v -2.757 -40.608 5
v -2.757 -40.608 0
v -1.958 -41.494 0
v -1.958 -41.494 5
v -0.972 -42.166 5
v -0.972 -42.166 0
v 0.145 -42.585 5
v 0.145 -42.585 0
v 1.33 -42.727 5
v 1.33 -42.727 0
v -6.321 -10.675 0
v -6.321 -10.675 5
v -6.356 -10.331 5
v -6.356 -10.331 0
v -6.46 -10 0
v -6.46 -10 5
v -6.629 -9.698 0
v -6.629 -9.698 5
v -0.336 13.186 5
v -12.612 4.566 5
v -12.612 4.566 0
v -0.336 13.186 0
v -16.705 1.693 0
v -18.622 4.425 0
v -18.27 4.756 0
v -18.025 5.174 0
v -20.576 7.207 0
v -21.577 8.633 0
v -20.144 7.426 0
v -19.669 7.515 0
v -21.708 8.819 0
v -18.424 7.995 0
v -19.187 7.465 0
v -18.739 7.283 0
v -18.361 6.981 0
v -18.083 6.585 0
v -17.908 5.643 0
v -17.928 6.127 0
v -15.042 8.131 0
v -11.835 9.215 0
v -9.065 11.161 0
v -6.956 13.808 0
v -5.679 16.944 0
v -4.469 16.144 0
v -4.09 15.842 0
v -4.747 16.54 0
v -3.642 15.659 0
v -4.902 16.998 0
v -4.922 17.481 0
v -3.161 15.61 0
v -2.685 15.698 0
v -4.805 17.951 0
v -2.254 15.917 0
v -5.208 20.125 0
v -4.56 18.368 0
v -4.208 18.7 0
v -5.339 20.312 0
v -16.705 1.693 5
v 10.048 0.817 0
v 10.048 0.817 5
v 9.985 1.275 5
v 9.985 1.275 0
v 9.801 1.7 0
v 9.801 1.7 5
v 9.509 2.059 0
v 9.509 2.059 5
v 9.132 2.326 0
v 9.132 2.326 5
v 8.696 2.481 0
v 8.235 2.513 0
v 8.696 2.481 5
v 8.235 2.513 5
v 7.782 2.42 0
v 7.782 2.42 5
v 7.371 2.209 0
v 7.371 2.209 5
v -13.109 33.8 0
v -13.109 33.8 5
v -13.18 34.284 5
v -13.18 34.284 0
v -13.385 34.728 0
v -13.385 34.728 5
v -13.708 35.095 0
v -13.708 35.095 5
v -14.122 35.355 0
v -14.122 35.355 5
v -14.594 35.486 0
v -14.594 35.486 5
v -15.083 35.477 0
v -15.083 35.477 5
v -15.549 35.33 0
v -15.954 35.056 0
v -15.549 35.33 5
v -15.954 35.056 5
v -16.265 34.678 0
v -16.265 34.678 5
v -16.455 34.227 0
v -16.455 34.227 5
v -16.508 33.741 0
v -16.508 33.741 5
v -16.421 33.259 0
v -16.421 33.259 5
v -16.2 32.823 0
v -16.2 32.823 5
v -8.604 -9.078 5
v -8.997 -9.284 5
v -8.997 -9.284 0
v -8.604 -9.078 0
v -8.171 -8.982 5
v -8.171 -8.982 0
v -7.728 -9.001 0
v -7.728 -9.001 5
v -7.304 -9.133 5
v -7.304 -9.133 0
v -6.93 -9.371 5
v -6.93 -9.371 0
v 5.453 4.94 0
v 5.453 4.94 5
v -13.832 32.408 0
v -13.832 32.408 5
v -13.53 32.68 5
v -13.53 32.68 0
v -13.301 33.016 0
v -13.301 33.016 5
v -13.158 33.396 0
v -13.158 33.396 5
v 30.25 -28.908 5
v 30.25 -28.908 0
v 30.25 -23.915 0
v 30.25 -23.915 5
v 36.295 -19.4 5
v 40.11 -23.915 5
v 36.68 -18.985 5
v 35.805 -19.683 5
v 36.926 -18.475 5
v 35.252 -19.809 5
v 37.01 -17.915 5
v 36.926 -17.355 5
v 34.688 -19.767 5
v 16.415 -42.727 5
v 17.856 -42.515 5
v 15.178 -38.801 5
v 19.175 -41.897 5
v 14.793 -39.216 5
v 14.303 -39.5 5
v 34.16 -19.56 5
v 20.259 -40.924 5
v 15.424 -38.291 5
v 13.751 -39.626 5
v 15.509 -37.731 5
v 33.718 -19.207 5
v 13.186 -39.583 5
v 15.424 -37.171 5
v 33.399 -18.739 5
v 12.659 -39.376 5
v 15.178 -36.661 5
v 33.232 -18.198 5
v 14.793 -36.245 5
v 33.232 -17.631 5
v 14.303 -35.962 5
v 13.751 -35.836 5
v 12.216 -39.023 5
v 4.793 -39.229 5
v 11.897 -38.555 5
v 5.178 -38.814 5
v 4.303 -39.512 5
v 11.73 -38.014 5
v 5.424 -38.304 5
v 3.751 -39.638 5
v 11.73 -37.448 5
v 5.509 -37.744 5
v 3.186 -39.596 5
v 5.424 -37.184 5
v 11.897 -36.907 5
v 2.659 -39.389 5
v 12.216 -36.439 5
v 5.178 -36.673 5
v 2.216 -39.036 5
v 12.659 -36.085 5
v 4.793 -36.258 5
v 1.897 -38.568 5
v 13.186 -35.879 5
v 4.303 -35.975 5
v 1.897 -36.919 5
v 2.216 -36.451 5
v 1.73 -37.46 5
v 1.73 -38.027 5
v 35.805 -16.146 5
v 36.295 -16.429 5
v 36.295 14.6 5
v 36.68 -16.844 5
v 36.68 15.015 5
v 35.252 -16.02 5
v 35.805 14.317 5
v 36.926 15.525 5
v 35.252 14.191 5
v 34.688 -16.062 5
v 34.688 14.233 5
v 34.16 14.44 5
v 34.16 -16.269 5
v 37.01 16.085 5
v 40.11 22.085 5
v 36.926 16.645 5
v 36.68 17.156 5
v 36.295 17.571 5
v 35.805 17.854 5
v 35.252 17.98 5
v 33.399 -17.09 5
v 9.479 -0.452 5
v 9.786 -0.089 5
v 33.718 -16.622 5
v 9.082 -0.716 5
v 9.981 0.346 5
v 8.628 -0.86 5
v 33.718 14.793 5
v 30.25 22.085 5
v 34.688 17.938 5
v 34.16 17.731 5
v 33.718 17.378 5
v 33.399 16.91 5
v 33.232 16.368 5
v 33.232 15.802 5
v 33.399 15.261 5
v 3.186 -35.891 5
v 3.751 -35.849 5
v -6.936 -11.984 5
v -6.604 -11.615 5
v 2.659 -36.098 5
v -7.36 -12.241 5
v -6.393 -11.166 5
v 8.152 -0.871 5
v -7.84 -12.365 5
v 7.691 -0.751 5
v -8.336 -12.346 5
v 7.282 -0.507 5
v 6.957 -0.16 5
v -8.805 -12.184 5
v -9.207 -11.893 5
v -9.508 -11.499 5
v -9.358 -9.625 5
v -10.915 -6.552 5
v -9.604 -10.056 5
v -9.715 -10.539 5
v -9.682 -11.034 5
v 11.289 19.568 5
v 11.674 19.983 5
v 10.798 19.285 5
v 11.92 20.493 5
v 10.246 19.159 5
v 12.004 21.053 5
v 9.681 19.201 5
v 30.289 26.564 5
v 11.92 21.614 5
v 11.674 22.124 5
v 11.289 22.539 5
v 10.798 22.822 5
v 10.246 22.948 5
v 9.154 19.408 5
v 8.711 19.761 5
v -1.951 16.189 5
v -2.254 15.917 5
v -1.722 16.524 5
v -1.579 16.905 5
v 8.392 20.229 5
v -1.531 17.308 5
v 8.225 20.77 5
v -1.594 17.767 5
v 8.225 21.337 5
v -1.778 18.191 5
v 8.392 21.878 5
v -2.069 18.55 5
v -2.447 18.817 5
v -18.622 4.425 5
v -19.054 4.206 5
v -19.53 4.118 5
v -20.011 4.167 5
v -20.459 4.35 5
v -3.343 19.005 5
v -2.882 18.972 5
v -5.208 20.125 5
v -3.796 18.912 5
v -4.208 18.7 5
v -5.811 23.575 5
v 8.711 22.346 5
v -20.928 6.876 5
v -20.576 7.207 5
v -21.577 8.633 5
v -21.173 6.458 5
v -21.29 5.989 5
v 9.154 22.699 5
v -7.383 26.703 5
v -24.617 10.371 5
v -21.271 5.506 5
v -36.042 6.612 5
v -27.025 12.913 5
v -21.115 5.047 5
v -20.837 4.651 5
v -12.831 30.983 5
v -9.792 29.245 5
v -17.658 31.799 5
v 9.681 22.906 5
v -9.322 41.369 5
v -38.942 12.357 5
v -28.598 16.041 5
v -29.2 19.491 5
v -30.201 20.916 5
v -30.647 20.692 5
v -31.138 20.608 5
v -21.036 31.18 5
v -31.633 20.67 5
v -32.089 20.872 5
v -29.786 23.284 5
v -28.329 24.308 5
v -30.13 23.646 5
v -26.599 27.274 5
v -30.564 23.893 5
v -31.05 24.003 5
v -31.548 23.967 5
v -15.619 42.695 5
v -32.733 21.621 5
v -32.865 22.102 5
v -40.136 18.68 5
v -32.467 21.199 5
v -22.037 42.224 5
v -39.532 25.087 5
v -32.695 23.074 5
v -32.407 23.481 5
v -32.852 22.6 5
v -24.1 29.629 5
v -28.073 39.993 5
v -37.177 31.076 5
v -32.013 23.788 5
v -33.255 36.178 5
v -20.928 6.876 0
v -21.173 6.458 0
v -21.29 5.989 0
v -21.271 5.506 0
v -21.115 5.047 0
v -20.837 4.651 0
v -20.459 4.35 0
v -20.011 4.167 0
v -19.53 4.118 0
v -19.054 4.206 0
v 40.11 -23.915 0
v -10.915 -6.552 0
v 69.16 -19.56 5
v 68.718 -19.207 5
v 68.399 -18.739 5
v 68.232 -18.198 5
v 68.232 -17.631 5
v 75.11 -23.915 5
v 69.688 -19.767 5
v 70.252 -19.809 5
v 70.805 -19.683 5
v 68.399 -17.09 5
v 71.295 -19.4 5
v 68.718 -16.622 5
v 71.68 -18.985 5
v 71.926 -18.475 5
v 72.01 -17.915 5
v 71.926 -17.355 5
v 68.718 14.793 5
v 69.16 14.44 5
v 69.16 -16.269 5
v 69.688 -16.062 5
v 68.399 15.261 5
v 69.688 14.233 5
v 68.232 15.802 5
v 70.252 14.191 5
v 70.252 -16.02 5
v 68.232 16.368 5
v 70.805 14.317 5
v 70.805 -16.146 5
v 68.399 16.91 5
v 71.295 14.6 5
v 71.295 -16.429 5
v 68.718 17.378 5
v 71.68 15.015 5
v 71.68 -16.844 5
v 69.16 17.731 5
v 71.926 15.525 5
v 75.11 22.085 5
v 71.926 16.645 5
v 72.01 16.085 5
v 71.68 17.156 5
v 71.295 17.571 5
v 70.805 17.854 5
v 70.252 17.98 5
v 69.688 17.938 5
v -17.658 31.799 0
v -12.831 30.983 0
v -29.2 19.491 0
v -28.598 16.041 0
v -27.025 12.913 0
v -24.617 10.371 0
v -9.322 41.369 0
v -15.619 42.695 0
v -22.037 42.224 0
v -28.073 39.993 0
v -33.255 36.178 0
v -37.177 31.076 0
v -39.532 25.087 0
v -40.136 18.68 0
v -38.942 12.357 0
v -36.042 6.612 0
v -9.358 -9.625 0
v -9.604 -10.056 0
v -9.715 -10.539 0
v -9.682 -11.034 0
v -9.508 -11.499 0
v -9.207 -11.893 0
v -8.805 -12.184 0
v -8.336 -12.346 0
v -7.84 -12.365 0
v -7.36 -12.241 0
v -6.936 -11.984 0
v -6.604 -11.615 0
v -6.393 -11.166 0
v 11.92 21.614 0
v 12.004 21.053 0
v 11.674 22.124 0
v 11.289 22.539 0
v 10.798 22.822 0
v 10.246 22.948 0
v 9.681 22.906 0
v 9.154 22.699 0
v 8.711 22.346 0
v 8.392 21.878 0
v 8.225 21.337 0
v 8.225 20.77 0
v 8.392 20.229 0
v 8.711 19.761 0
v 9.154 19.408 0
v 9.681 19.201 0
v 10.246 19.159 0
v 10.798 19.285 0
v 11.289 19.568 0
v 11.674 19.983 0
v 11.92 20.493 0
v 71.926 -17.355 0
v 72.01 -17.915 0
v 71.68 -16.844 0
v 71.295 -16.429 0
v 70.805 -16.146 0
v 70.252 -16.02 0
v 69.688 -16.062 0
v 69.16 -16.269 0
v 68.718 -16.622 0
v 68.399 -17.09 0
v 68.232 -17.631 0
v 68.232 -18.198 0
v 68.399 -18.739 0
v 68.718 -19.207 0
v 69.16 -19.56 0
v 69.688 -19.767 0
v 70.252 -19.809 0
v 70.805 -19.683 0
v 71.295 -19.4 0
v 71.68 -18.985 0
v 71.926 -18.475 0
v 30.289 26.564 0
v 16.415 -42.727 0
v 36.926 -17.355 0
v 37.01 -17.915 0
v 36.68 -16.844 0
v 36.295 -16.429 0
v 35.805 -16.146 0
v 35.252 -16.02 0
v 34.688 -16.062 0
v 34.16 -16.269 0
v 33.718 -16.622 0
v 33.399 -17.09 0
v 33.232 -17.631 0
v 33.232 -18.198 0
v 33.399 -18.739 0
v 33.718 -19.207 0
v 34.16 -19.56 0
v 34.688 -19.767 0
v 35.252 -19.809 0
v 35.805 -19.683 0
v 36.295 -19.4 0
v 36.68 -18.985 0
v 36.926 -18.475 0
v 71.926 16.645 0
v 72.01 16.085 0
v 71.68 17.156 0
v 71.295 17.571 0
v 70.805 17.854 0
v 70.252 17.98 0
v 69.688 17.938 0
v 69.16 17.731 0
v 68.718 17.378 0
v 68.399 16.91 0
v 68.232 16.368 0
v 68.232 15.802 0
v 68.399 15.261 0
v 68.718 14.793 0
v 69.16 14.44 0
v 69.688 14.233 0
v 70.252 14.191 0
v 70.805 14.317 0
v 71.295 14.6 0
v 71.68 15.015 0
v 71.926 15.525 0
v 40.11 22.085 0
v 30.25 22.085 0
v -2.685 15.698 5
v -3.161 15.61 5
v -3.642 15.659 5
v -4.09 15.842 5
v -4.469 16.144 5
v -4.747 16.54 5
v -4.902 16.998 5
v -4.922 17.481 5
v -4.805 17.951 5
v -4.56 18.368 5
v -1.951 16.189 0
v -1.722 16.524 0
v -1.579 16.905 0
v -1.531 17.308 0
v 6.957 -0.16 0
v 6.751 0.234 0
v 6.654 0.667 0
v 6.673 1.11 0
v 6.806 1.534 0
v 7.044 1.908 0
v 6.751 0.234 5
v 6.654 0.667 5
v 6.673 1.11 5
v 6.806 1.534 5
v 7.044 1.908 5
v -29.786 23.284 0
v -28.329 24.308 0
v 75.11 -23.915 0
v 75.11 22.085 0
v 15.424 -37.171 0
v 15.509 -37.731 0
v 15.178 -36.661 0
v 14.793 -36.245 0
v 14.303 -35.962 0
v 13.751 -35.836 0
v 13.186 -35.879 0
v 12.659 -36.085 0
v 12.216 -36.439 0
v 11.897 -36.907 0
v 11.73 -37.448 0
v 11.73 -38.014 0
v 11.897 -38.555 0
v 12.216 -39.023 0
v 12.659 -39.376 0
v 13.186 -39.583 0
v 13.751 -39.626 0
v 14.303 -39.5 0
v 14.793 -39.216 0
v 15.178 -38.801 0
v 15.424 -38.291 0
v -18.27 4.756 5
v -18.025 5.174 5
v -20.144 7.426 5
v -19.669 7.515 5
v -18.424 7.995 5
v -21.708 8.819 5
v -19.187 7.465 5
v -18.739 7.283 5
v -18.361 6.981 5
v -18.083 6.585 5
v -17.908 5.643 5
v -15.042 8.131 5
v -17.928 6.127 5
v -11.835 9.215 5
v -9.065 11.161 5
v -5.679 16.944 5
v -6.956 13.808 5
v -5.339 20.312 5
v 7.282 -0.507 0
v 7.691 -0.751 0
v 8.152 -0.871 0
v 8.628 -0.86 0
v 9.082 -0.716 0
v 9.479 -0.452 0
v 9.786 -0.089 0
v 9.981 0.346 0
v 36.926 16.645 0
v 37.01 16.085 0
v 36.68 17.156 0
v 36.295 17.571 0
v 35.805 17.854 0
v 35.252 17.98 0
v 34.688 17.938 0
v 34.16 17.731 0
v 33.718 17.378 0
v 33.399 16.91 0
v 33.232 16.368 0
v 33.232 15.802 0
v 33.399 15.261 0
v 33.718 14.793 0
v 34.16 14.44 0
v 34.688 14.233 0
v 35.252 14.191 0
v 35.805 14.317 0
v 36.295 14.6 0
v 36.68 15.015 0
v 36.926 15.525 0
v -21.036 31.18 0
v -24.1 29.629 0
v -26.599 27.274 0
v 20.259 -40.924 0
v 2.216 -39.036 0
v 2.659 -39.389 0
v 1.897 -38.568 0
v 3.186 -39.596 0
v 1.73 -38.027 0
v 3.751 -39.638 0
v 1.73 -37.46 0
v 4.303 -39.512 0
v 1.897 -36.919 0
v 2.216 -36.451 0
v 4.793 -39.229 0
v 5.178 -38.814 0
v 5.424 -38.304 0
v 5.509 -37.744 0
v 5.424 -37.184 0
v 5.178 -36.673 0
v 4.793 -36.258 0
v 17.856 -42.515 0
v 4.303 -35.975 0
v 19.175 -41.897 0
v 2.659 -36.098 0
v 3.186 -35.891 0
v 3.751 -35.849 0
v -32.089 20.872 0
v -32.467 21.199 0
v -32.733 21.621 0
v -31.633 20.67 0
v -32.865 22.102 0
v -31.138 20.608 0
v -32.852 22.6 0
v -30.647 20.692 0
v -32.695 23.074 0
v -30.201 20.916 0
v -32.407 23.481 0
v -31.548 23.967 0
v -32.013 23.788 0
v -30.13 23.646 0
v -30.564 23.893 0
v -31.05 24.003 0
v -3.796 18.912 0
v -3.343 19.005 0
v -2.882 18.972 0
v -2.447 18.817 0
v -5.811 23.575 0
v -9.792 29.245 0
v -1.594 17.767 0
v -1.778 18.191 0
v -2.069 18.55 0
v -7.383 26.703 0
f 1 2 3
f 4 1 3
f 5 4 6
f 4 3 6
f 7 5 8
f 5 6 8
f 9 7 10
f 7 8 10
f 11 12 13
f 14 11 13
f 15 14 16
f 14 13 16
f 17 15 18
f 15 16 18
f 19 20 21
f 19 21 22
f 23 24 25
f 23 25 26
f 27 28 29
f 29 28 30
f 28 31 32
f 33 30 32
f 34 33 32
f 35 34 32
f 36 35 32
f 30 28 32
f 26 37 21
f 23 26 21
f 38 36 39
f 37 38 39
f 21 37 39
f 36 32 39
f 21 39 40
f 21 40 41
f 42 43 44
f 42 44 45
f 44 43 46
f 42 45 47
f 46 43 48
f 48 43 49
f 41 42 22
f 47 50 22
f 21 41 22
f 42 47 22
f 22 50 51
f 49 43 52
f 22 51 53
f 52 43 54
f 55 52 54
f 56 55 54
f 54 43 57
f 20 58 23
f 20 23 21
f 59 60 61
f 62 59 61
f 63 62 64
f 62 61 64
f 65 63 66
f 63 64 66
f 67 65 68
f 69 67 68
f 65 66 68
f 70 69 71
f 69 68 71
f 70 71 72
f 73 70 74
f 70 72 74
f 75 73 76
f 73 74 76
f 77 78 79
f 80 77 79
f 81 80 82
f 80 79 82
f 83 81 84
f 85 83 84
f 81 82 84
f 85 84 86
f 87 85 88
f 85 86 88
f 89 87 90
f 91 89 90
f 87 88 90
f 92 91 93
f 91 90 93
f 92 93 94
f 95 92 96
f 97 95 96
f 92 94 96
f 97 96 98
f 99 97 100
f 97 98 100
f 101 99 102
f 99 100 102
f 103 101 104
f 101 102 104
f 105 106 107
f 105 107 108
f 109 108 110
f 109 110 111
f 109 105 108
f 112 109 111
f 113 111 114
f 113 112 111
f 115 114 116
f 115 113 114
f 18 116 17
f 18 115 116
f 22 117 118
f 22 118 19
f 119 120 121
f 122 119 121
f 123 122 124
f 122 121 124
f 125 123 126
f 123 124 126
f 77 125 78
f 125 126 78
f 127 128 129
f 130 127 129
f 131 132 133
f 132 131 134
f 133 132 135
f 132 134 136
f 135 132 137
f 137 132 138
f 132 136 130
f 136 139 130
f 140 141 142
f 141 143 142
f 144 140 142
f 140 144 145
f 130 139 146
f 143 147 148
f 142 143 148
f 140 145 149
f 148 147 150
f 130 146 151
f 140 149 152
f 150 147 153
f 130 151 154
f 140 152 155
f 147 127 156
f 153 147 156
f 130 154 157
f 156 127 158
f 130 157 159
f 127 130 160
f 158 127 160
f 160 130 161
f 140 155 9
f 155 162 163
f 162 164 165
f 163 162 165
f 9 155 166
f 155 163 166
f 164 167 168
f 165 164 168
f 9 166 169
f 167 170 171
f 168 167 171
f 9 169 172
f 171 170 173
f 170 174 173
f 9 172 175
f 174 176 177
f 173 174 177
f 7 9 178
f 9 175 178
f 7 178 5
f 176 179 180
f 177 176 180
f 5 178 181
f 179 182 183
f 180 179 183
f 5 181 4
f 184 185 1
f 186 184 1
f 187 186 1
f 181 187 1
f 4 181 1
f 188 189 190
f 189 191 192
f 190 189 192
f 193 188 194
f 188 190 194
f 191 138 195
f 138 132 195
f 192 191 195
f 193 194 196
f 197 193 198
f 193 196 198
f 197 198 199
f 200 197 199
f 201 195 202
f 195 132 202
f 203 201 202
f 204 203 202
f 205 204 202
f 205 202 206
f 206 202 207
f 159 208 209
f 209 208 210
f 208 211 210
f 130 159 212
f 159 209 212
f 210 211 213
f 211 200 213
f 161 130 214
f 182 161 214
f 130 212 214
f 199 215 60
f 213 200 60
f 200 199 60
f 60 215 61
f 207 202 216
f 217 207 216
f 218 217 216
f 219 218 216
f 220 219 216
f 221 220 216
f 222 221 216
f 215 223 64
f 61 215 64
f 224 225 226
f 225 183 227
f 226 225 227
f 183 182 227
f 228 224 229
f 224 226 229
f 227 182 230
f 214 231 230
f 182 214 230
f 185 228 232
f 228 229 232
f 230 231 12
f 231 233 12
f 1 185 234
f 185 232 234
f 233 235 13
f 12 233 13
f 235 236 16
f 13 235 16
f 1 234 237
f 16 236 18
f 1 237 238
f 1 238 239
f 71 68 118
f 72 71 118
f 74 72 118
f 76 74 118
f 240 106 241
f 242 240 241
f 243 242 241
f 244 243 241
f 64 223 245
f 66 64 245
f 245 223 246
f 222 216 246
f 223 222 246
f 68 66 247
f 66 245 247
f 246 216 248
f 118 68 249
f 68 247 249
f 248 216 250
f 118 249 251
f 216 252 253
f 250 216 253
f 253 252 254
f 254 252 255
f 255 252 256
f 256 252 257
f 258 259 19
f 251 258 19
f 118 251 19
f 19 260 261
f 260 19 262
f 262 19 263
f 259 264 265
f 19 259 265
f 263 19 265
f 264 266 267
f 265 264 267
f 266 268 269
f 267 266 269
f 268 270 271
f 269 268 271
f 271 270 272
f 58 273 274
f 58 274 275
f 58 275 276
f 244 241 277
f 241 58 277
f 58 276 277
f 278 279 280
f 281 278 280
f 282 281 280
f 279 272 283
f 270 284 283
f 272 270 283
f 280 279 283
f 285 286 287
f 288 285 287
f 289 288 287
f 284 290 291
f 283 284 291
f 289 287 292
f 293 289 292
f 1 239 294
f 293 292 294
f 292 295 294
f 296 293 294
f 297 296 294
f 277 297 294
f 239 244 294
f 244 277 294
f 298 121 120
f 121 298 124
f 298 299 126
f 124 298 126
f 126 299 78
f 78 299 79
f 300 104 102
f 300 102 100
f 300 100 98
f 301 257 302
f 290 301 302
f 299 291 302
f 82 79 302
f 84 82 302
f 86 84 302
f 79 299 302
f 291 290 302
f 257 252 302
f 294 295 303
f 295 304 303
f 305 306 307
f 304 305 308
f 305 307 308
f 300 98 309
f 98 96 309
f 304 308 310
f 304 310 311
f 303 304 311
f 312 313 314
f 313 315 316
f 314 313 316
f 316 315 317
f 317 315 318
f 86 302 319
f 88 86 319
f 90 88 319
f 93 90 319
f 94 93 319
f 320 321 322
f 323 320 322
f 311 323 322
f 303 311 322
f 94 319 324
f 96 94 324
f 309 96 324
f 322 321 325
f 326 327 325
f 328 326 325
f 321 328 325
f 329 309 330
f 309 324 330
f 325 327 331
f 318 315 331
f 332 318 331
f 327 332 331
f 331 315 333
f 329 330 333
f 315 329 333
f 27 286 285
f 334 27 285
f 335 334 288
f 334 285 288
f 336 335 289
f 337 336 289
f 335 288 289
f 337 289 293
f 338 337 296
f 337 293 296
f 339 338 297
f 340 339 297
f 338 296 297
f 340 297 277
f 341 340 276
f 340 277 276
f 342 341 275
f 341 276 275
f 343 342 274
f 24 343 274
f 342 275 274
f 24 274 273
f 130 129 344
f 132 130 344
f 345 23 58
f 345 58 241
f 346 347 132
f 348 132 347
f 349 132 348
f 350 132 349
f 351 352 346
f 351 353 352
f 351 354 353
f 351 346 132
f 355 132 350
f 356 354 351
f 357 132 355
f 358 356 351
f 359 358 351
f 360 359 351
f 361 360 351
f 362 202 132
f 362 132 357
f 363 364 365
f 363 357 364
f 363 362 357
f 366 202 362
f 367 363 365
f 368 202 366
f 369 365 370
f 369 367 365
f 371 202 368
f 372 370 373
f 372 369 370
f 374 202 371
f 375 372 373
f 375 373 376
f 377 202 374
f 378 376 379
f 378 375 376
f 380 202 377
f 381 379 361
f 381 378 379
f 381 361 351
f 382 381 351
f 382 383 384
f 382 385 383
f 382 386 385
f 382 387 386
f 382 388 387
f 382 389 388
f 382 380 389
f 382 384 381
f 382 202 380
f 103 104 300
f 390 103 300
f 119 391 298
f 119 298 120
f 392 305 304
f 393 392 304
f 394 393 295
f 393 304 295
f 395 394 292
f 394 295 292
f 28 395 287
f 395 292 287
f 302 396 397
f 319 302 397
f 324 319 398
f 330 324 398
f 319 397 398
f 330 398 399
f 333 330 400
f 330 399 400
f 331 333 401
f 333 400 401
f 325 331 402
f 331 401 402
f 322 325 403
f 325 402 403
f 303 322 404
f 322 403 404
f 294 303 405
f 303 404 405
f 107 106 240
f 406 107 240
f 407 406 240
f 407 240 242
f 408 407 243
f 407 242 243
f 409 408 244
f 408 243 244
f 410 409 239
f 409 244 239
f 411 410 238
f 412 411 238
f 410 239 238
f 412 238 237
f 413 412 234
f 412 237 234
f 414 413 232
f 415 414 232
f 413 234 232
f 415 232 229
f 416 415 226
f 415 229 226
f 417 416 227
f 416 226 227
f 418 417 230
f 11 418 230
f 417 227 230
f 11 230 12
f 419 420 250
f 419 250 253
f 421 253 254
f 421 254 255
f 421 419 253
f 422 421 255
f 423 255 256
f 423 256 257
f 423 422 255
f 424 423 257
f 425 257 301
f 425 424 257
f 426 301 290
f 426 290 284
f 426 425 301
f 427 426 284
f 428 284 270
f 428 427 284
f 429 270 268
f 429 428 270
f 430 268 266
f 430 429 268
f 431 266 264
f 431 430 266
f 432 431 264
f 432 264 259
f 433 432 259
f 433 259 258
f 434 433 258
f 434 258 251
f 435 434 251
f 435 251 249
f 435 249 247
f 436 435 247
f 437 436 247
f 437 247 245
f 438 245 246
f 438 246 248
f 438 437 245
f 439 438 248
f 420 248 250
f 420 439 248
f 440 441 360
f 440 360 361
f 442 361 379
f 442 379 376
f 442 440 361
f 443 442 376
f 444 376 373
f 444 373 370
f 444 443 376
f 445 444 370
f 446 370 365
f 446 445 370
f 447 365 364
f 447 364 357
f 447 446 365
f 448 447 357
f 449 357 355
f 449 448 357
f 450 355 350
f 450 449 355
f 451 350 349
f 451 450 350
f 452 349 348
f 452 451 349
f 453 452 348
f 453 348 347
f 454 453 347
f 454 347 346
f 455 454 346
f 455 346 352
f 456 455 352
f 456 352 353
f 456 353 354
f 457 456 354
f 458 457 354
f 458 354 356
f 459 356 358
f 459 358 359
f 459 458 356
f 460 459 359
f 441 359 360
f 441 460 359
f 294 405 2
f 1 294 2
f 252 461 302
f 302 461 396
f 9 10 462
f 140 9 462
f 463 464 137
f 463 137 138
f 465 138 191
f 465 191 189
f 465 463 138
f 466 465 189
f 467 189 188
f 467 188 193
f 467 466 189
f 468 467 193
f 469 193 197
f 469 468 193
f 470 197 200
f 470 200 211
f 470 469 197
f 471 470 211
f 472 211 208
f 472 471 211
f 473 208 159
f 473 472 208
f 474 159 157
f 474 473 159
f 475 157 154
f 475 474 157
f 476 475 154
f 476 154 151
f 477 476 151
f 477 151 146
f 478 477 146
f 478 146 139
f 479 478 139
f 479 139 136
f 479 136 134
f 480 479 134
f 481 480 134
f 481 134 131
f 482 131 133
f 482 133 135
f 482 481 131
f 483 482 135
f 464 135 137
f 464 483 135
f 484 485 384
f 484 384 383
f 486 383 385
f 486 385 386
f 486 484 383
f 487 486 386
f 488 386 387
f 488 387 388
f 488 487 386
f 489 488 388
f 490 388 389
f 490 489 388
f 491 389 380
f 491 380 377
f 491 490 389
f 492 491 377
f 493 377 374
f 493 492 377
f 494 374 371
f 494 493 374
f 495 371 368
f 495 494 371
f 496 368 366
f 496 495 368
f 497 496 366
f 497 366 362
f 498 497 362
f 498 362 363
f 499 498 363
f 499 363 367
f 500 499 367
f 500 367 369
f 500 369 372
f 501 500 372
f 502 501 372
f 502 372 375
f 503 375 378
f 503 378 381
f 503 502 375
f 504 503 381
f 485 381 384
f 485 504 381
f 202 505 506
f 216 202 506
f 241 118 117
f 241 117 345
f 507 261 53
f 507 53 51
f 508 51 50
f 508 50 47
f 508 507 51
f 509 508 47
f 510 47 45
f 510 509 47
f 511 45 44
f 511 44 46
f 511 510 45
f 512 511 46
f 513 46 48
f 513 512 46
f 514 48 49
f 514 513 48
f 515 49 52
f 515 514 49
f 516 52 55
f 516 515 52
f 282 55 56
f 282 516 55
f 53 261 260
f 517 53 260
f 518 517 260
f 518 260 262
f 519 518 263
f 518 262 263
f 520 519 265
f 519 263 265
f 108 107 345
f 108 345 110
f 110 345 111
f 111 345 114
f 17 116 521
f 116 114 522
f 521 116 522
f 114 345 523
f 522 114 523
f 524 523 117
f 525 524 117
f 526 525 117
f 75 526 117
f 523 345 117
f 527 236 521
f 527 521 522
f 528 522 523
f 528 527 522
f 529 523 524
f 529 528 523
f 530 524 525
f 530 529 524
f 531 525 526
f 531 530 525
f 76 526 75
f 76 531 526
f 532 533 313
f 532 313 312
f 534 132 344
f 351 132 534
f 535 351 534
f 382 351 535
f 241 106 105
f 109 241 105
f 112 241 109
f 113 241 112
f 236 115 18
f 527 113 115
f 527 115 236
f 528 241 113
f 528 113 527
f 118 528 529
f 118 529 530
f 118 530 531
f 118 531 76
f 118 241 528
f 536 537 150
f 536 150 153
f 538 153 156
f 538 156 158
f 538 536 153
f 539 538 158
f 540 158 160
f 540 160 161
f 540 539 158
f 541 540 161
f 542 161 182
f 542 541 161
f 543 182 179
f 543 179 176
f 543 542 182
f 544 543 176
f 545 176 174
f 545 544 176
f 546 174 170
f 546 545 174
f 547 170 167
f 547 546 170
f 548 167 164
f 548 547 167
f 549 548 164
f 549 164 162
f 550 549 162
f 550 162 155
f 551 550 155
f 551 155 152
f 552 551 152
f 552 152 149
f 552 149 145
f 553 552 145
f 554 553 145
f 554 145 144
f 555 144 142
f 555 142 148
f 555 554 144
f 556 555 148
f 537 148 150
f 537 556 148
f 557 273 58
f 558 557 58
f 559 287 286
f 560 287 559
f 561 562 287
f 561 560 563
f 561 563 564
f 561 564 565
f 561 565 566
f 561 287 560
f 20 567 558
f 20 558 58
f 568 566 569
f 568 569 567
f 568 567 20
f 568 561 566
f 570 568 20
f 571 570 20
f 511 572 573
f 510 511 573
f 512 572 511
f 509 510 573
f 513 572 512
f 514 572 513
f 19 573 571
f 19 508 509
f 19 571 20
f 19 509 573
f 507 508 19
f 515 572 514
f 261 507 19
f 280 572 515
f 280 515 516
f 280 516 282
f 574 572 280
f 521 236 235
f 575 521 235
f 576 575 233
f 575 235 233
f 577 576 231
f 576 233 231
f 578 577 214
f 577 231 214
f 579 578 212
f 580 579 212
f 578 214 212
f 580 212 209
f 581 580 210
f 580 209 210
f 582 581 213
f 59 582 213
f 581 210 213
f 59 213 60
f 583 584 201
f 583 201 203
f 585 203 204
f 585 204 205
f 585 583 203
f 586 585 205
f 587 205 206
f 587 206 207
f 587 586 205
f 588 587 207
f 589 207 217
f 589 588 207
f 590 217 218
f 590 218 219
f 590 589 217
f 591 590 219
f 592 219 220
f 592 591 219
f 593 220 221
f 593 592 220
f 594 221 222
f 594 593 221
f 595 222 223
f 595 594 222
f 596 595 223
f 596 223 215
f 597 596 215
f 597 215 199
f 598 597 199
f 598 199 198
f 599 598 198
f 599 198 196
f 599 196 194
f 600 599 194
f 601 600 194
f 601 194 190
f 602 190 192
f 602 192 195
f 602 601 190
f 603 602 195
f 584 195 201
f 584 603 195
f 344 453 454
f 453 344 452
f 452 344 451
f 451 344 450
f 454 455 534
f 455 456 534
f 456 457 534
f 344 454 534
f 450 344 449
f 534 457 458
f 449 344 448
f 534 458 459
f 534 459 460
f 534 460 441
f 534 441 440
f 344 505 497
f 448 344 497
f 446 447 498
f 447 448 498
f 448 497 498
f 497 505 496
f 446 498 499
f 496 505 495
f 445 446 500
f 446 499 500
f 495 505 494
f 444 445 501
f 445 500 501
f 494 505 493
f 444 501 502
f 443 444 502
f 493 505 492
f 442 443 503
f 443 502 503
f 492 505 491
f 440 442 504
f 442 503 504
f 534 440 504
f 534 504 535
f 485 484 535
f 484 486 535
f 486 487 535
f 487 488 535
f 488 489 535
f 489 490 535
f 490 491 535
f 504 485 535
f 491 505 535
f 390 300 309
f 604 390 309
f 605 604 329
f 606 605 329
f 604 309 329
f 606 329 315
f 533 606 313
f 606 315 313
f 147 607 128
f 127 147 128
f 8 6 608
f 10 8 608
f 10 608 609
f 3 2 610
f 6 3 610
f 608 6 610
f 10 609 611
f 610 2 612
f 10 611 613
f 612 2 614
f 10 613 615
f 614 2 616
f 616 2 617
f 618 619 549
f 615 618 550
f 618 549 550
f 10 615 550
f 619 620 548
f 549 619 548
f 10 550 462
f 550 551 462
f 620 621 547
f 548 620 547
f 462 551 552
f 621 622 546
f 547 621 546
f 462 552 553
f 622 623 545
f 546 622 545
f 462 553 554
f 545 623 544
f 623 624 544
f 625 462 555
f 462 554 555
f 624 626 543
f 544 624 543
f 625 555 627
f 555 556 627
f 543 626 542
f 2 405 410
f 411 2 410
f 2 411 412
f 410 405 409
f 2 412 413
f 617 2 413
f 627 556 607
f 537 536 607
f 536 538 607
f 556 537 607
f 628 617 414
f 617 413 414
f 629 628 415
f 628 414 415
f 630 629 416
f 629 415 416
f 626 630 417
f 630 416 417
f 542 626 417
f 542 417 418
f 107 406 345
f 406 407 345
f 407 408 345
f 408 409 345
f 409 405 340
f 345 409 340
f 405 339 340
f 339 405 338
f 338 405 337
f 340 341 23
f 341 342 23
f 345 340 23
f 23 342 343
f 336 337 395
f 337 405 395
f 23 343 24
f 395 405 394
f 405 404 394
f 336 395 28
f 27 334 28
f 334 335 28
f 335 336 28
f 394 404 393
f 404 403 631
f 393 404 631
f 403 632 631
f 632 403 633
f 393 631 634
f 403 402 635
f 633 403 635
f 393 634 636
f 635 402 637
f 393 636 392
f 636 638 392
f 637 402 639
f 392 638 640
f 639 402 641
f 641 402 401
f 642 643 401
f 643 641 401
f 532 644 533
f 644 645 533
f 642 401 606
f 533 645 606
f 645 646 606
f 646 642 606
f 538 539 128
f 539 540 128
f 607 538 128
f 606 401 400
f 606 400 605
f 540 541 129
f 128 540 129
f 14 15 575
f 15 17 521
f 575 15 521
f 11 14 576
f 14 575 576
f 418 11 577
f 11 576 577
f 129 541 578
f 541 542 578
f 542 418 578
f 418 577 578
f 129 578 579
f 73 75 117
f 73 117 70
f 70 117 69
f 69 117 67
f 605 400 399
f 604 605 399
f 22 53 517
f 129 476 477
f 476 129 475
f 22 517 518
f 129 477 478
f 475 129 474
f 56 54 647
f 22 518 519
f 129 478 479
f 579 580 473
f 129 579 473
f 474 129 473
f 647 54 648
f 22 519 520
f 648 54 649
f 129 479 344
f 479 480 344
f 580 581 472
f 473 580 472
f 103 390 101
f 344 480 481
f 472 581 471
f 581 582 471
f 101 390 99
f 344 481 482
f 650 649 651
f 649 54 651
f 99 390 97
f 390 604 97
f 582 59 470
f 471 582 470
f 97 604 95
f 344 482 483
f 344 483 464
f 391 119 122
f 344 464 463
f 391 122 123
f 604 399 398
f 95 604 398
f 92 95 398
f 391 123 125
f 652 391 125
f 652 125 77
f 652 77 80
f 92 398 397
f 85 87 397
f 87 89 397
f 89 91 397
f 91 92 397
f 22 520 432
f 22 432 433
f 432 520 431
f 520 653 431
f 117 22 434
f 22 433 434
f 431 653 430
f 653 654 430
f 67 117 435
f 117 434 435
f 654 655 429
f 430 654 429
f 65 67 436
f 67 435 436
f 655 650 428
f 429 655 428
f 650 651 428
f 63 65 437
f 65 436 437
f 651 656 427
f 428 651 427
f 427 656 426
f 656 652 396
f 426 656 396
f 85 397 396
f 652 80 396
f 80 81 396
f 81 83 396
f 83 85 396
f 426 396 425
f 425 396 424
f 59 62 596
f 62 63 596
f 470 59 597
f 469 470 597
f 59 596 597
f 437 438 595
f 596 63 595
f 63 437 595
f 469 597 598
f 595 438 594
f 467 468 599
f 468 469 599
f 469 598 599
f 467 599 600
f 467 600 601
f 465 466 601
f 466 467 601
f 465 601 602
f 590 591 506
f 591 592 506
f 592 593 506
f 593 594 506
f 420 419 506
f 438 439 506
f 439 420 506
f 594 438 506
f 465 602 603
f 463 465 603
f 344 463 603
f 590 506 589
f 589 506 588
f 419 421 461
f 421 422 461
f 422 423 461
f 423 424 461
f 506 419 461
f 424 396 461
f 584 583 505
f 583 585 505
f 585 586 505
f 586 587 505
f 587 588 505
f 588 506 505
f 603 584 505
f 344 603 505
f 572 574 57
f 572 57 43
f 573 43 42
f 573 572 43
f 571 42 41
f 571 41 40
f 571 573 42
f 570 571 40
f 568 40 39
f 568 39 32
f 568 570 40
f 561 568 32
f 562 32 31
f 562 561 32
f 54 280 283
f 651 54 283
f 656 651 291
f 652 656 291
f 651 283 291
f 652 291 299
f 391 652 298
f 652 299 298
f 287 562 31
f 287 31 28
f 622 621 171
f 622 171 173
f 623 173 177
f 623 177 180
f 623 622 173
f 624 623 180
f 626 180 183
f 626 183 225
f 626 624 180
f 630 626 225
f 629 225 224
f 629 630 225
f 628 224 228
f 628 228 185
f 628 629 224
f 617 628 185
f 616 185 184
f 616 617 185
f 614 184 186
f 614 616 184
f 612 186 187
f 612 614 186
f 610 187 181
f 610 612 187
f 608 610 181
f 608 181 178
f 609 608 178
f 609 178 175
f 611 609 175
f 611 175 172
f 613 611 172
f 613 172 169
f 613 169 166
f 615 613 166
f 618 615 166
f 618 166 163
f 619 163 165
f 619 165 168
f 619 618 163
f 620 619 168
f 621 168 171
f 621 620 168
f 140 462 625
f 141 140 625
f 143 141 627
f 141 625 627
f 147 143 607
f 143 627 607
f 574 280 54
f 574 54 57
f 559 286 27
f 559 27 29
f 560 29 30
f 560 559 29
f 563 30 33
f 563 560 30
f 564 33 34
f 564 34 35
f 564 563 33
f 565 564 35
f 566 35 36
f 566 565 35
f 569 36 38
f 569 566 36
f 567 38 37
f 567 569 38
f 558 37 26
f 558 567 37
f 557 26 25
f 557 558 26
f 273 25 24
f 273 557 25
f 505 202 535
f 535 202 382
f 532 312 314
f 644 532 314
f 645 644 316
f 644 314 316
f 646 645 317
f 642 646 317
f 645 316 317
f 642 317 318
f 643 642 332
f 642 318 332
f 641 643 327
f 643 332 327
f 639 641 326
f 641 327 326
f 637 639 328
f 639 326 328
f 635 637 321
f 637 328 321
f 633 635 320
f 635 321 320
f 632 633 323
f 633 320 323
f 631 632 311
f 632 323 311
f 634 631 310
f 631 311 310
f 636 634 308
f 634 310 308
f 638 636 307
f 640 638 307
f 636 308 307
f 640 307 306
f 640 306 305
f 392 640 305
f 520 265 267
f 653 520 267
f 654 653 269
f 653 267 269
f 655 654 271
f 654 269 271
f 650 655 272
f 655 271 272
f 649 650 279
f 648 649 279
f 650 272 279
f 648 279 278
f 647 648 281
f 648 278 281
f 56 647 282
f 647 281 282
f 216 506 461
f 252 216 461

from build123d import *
from build123d.topology import SkipClean

# Parameters (mm, degrees)
ESQUISSE1_R         = 1.9
ESQUISSE1_R_2       = 1.950000027
BOSS_EXTRU_1_DEPTH  = 5
EXTRUDE_1_DEPTH     = 5
CUT_EXTRUDE_1_DEPTH = 5
CUT_EXTRUDE_2_DEPTH = 5
EXTRUDE_3_DEPTH     = 5
SKETCH_5_W          = 35
SKETCH_5_H          = 46
EXTRUDE_4_DEPTH     = 5
CUT_EXTRUDE_START   = -5
SKETCH_6_R          = 1.9
CUT_EXTRUDE_3_DEPTH = 5


with BuildPart() as part:
    # Esquisse1 → Boss.-Extru.1 (new body)
    with BuildSketch(Plane.XY):
        with BuildLine():
            Line((-36.042079519, 6.612329971), (-2.756888739, -40.60806749))
            ThreePointArc((-2.756888739, -40.60806749), (-0.971927818, -42.166026475), (1.329860158, -42.727358644))
            Line((1.329860158, -42.727358644), (16.414744778, -42.727358644))
            ThreePointArc((16.414744778, -42.727358644), (18.537962215, -42.254161899), (20.25929982, -40.92413773))
            Line((20.25929982, -40.92413773), (30.250474641, -28.908411747))
            Line((30.250474641, -28.908411747), (30.250474641, -23.914585762))
            Line((30.250474641, -23.914585762), (40.110474641, -23.914585762))
            Line((40.110474641, -23.914585762), (40.110474641, 22.085414238))
            Line((40.110474641, 22.085414238), (30.250474641, 22.085414238))
            Line((30.250474641, 22.085414238), (30.289127967, 26.563728114))
            Line((30.289127967, 26.563728114), (-9.322024272, 41.369413347))
            ThreePointArc((-9.322024272, 41.369413347), (-35.395503084, 33.764537489), (-36.042079519, 6.612329971))
        make_face()
        with Locations((-29.585096552, 28.740581162)):
            Circle(ESQUISSE1_R, mode=Mode.SUBTRACT)
        with Locations((-21.4008614, 34.486736198)):
            Circle(ESQUISSE1_R, mode=Mode.SUBTRACT)
        with Locations((-1.428936876, -11.362171084)):
            Circle(ESQUISSE1_R_2, mode=Mode.SUBTRACT)
        with Locations((6.755298276, -5.616016048)):
            Circle(ESQUISSE1_R_2, mode=Mode.SUBTRACT)
        with Locations((10.104149324, 21.053484932)):
            Circle(ESQUISSE1_R, mode=Mode.SUBTRACT)
        with Locations((3.608581782, -37.743606202)):
            Circle(ESQUISSE1_R, mode=Mode.SUBTRACT)
        with Locations((13.608573866, -37.73091599)):
            Circle(ESQUISSE1_R, mode=Mode.SUBTRACT)
        with Locations((35.110474641, -17.914585762)):
            Circle(ESQUISSE1_R, mode=Mode.SUBTRACT)
        with Locations((35.110474641, 16.085214419)):
            Circle(ESQUISSE1_R, mode=Mode.SUBTRACT)
        with BuildLine():
            Line((-14.809164556, 33.799672662), (-20.660891689, 29.691172522))
            ThreePointArc((-20.660891689, 29.691172522), (-22.18628804, 29.363713126), (-23.482781796, 30.231565432))
            Line((-23.482781796, 30.231565432), (-25.924897053, 33.709865414))
            ThreePointArc((-25.924897053, 33.709865414), (-26.47826462, 34.0839702), (-27.131559209, 33.944771651))
            ThreePointArc((-27.131559209, 33.944771651), (-27.478774003, 33.409530528), (-27.357701898, 32.783125931))
            Line((-27.357701898, 32.783125931), (-24.915585604, 29.304825893))
            ThreePointArc((-24.915585604, 29.304825893), (-24.495010021, 27.771470128), (-25.32590655, 26.415861527))
            Line((-25.32590655, 26.415861527), (-31.177633683, 22.307361387))
            Line((-31.177633683, 22.307361387), (-8.020629273, -10.675105791))
            Line((-8.020629273, -10.675105791), (-2.16890246, -6.566605875))
            ThreePointArc((-2.16890246, -6.566605875), (-0.674874752, -6.233398064), (0.617175813, -7.054221782))
            Line((0.617175813, -7.054221782), (3.05929141, -10.532521451))
            ThreePointArc((3.05929141, -10.532521451), (3.608413847, -10.881372123), (4.243376724, -10.739758611))
            ThreePointArc((4.243376724, -10.739758611), (4.592227421, -10.190636157), (4.450613892, -9.555673255))
            Line((4.450613892, -9.555673255), (2.008497767, -6.077373005))
            ThreePointArc((2.008497767, -6.077373005), (1.675290093, -4.583345549), (2.496113536, -3.291295137))
            Line((2.496113536, -3.291295137), (8.347839718, 0.817205678))
            Line((8.347839718, 0.817205678), (-14.809164556, 33.799672662))
        make_face(mode=Mode.SUBTRACT)
    extrude(amount=BOSS_EXTRU_1_DEPTH)

    # 草图1 → 凸台-拉伸1 (add)
    with BuildSketch(Plane.XY.offset(5)):
        Polygon((-31.177633683, 22.307361387), (-35.97039471, 29.133678309), (-19.693347321, 40.561802618), (-14.809164556, 33.799672662), align=None)
        Polygon((-8.020629273, -10.675105791), (8.347839718, 0.817205678), (13.184422938, -6.071527079), (-3.384378671, -17.704492194), align=None)
    extrude(amount=-EXTRUDE_1_DEPTH)

    # 草图2 → 切除-拉伸1 (cut)
    with BuildSketch(Plane.XY.offset(5)):
        with BuildLine():
            Line((-30.200787341, 20.916041429), (-31.177633683, 22.307361387))
            Line((-31.177633683, 22.307361387), (-29.786313807, 23.284207845))
            ThreePointArc((-29.786313807, 23.284207845), (-32.852180144, 22.600438421), (-30.200787341, 20.916041429))
        make_face()
        with BuildLine():
            Line((-16.200484514, 32.82282632), (-14.809164556, 33.799672662))
            Line((-14.809164556, 33.799672662), (-13.832318214, 32.408352704))
            ThreePointArc((-13.832318214, 32.408352704), (-13.30074837, 33.015656967), (-13.109164556, 33.799672662))
            ThreePointArc((-13.109164556, 33.799672662), (-15.321393056, 35.42066679), (-16.200484514, 32.82282632))
        make_face()
        with BuildLine():
            Line((-4.207508761, 18.699759128), (-3.230662419, 17.30843917))
            Line((-3.230662419, 17.30843917), (-2.253816078, 15.917119212))
            ThreePointArc((-2.253816078, 15.917119212), (-1.722246233, 16.524423475), (-1.530662419, 17.30843917))
            ThreePointArc((-1.530662419, 17.30843917), (-2.446646724, 18.816855356), (-4.207508761, 18.699759128))
        make_face()
        with BuildLine():
            Line((-19.599131478, 5.816127798), (-20.57597782, 7.207447756))
            ThreePointArc((-20.57597782, 7.207447756), (-20.990451436, 4.839281457), (-18.622285137, 4.42480784))
            Line((-18.622285137, 4.42480784), (-19.599131478, 5.816127798))
        make_face()
        with BuildLine():
            Line((-8.020629273, -10.675105791), (-8.997475615, -9.283785833))
            ThreePointArc((-8.997475615, -9.283785833), (-8.804644968, -12.183521977), (-6.320629273, -10.675105791))
            ThreePointArc((-6.320629273, -10.675105791), (-6.399635145, -10.162877291), (-6.629309315, -9.698259449))
            Line((-6.629309315, -9.698259449), (-8.020629273, -10.675105791))
        make_face()
        with BuildLine():
            ThreePointArc((-6.629309315, -9.698259449), (-7.727552169, -9.000559341), (-8.997475615, -9.283785833))
            Line((-8.997475615, -9.283785833), (-8.020629273, -10.675105791))
            Line((-8.020629273, -10.675105791), (-6.629309315, -9.698259449))
        make_face()
        with BuildLine():
            Line((8.347839718, 0.817205678), (7.370993376, 2.208525636))
            ThreePointArc((7.370993376, 2.208525636), (6.673293247, 1.110282658), (6.956519906, -0.159640871))
            Line((6.956519906, -0.159640871), (8.347839718, 0.817205678))
        make_face()
        with BuildLine():
            ThreePointArc((10.047839718, 0.817205678), (9.131855413, 2.325621864), (7.370993376, 2.208525636))
            Line((7.370993376, 2.208525636), (8.347839718, 0.817205678))
            Line((8.347839718, 0.817205678), (6.956519906, -0.159640871))
            ThreePointArc((6.956519906, -0.159640871), (8.860068338, -0.803788412), (10.047839718, 0.817205678))
        make_face()
    extrude(amount=-CUT_EXTRUDE_1_DEPTH, mode=Mode.SUBTRACT)

    # 草图3 → 切除-拉伸2 (cut)
    with BuildSketch(Plane.XY.offset(5)):
        with BuildLine():
            Line((-21.576815105, 8.632937959), (-29.199951088, 19.490552697))
            ThreePointArc((-29.199951088, 19.490552697), (-27.025230106, 12.912514338), (-21.576815105, 8.632937959))
        make_face()
        with BuildLine():
            ThreePointArc((-28.328515046, 24.307729049), (-28.734520323, 23.132131809), (-29.016664647, 21.920825185))
            Line((-29.016664647, 21.920825185), (-5.391631455, 17.694975372))
            ThreePointArc((-5.391631455, 17.694975372), (-5.251110798, 18.747287049), (-5.204148051, 19.807900278))
            ThreePointArc((-5.204148051, 19.807900278), (-5.205197337, 19.966587945), (-5.208345014, 20.12524786))
            Line((-5.208345014, 20.12524786), (-12.831480997, 30.982862597))
            ThreePointArc((-12.831480997, 30.982862597), (-15.202807683, 31.639833203), (-17.658285182, 31.799303844))
            Line((-17.658285182, 31.799303844), (-20.660891689, 29.691172522))
            Line((-20.660891689, 29.691172522), (-25.325906895, 26.415862018))
            Line((-25.325906895, 26.415862018), (-28.328515046, 24.307729049))
        make_face()
        with BuildLine():
            ThreePointArc((-17.658285182, 31.799303844), (-24.099535109, 29.628981549), (-28.328515046, 24.307729049))
            Line((-28.328515046, 24.307729049), (-25.325906895, 26.415862018))
            Line((-25.325906895, 26.415862018), (-20.660891689, 29.691172522))
            Line((-20.660891689, 29.691172522), (-17.658285182, 31.799303844))
        make_face()
        with BuildLine():
            Line((-12.831480997, 30.982862597), (-5.208345014, 20.12524786))
            ThreePointArc((-5.208345014, 20.12524786), (-7.383065996, 26.703286219), (-12.831480997, 30.982862597))
        make_face()
    extrude(amount=-CUT_EXTRUDE_2_DEPTH, mode=Mode.SUBTRACT)

    # 草图4 → 凸台-拉伸3 (add)
    with SkipClean():  # the faces are left unmerged after this step: merging them gives an invalid solid
        with BuildSketch(Plane.XY.offset(5)):
            with BuildLine():
                ThreePointArc((-5.339316546, 20.311790307), (-10.38028646, 10.088690187), (-21.707786637, 8.819480406))
                Line((-21.707786637, 8.819480406), (-20.57597782, 7.207447756))
                ThreePointArc((-20.57597782, 7.207447756), (-18.20781152, 6.79297414), (-18.622285137, 4.42480784))
                Line((-18.622285137, 4.42480784), (-16.704506194, 1.693319781))
                Line((-16.704506194, 1.693319781), (-12.612388659, 4.566397265))
                Line((-12.612388659, 4.566397265), (-0.336036876, 13.185630785))
                Line((-0.336036876, 13.185630785), (-2.253816078, 15.917119212))
                ThreePointArc((-2.253816078, 15.917119212), (-4.621982377, 16.331592828), (-4.207508761, 18.699759128))
                Line((-4.207508761, 18.699759128), (-5.339316546, 20.311790307))
            make_face()
            with BuildLine():
                Line((5.453214175, 4.940014063), (-10.915254816, -6.552297405))
                Line((-10.915254816, -6.552297405), (-8.997475615, -9.283785833))
                ThreePointArc((-8.997475615, -9.283785833), (-7.727552249, -9.000559327), (-6.629309409, -9.698259316))
                Line((-6.629309409, -9.698259316), (6.956519854, -0.159640797))
                ThreePointArc((6.956519854, -0.159640797), (6.673293255, 1.110282702), (7.370993376, 2.208525636))
                Line((7.370993376, 2.208525636), (5.453214175, 4.940014063))
            make_face()
        extrude(amount=-EXTRUDE_3_DEPTH)

    # 草图5 → 凸台-拉伸4 (add)
    with SkipClean():  # the faces are left unmerged after this step: merging them gives an invalid solid
        with BuildSketch(Plane.XY.offset(5)):
            with Locations((57.610474641, -0.914585762)):
                Rectangle(SKETCH_5_W, SKETCH_5_H)
        extrude(amount=-EXTRUDE_4_DEPTH)

    # 草图6 → 切除-拉伸3 (cut)
    with SkipClean():  # the faces are left unmerged after this step: merging them gives an invalid solid
        with BuildSketch(Plane.XY.offset(5).offset(CUT_EXTRUDE_START)):
            with Locations((35.110474641, 16.085214419)):
                Circle(SKETCH_6_R)
            with Locations((70.110474641, 16.085214419)):
                Circle(SKETCH_6_R)
            with Locations((35.110474641, -17.914585762)):
                Circle(SKETCH_6_R)
            with Locations((70.110474641, -17.914585762)):
                Circle(SKETCH_6_R)
        extrude(amount=CUT_EXTRUDE_3_DEPTH, mode=Mode.SUBTRACT)


solid = part.part
